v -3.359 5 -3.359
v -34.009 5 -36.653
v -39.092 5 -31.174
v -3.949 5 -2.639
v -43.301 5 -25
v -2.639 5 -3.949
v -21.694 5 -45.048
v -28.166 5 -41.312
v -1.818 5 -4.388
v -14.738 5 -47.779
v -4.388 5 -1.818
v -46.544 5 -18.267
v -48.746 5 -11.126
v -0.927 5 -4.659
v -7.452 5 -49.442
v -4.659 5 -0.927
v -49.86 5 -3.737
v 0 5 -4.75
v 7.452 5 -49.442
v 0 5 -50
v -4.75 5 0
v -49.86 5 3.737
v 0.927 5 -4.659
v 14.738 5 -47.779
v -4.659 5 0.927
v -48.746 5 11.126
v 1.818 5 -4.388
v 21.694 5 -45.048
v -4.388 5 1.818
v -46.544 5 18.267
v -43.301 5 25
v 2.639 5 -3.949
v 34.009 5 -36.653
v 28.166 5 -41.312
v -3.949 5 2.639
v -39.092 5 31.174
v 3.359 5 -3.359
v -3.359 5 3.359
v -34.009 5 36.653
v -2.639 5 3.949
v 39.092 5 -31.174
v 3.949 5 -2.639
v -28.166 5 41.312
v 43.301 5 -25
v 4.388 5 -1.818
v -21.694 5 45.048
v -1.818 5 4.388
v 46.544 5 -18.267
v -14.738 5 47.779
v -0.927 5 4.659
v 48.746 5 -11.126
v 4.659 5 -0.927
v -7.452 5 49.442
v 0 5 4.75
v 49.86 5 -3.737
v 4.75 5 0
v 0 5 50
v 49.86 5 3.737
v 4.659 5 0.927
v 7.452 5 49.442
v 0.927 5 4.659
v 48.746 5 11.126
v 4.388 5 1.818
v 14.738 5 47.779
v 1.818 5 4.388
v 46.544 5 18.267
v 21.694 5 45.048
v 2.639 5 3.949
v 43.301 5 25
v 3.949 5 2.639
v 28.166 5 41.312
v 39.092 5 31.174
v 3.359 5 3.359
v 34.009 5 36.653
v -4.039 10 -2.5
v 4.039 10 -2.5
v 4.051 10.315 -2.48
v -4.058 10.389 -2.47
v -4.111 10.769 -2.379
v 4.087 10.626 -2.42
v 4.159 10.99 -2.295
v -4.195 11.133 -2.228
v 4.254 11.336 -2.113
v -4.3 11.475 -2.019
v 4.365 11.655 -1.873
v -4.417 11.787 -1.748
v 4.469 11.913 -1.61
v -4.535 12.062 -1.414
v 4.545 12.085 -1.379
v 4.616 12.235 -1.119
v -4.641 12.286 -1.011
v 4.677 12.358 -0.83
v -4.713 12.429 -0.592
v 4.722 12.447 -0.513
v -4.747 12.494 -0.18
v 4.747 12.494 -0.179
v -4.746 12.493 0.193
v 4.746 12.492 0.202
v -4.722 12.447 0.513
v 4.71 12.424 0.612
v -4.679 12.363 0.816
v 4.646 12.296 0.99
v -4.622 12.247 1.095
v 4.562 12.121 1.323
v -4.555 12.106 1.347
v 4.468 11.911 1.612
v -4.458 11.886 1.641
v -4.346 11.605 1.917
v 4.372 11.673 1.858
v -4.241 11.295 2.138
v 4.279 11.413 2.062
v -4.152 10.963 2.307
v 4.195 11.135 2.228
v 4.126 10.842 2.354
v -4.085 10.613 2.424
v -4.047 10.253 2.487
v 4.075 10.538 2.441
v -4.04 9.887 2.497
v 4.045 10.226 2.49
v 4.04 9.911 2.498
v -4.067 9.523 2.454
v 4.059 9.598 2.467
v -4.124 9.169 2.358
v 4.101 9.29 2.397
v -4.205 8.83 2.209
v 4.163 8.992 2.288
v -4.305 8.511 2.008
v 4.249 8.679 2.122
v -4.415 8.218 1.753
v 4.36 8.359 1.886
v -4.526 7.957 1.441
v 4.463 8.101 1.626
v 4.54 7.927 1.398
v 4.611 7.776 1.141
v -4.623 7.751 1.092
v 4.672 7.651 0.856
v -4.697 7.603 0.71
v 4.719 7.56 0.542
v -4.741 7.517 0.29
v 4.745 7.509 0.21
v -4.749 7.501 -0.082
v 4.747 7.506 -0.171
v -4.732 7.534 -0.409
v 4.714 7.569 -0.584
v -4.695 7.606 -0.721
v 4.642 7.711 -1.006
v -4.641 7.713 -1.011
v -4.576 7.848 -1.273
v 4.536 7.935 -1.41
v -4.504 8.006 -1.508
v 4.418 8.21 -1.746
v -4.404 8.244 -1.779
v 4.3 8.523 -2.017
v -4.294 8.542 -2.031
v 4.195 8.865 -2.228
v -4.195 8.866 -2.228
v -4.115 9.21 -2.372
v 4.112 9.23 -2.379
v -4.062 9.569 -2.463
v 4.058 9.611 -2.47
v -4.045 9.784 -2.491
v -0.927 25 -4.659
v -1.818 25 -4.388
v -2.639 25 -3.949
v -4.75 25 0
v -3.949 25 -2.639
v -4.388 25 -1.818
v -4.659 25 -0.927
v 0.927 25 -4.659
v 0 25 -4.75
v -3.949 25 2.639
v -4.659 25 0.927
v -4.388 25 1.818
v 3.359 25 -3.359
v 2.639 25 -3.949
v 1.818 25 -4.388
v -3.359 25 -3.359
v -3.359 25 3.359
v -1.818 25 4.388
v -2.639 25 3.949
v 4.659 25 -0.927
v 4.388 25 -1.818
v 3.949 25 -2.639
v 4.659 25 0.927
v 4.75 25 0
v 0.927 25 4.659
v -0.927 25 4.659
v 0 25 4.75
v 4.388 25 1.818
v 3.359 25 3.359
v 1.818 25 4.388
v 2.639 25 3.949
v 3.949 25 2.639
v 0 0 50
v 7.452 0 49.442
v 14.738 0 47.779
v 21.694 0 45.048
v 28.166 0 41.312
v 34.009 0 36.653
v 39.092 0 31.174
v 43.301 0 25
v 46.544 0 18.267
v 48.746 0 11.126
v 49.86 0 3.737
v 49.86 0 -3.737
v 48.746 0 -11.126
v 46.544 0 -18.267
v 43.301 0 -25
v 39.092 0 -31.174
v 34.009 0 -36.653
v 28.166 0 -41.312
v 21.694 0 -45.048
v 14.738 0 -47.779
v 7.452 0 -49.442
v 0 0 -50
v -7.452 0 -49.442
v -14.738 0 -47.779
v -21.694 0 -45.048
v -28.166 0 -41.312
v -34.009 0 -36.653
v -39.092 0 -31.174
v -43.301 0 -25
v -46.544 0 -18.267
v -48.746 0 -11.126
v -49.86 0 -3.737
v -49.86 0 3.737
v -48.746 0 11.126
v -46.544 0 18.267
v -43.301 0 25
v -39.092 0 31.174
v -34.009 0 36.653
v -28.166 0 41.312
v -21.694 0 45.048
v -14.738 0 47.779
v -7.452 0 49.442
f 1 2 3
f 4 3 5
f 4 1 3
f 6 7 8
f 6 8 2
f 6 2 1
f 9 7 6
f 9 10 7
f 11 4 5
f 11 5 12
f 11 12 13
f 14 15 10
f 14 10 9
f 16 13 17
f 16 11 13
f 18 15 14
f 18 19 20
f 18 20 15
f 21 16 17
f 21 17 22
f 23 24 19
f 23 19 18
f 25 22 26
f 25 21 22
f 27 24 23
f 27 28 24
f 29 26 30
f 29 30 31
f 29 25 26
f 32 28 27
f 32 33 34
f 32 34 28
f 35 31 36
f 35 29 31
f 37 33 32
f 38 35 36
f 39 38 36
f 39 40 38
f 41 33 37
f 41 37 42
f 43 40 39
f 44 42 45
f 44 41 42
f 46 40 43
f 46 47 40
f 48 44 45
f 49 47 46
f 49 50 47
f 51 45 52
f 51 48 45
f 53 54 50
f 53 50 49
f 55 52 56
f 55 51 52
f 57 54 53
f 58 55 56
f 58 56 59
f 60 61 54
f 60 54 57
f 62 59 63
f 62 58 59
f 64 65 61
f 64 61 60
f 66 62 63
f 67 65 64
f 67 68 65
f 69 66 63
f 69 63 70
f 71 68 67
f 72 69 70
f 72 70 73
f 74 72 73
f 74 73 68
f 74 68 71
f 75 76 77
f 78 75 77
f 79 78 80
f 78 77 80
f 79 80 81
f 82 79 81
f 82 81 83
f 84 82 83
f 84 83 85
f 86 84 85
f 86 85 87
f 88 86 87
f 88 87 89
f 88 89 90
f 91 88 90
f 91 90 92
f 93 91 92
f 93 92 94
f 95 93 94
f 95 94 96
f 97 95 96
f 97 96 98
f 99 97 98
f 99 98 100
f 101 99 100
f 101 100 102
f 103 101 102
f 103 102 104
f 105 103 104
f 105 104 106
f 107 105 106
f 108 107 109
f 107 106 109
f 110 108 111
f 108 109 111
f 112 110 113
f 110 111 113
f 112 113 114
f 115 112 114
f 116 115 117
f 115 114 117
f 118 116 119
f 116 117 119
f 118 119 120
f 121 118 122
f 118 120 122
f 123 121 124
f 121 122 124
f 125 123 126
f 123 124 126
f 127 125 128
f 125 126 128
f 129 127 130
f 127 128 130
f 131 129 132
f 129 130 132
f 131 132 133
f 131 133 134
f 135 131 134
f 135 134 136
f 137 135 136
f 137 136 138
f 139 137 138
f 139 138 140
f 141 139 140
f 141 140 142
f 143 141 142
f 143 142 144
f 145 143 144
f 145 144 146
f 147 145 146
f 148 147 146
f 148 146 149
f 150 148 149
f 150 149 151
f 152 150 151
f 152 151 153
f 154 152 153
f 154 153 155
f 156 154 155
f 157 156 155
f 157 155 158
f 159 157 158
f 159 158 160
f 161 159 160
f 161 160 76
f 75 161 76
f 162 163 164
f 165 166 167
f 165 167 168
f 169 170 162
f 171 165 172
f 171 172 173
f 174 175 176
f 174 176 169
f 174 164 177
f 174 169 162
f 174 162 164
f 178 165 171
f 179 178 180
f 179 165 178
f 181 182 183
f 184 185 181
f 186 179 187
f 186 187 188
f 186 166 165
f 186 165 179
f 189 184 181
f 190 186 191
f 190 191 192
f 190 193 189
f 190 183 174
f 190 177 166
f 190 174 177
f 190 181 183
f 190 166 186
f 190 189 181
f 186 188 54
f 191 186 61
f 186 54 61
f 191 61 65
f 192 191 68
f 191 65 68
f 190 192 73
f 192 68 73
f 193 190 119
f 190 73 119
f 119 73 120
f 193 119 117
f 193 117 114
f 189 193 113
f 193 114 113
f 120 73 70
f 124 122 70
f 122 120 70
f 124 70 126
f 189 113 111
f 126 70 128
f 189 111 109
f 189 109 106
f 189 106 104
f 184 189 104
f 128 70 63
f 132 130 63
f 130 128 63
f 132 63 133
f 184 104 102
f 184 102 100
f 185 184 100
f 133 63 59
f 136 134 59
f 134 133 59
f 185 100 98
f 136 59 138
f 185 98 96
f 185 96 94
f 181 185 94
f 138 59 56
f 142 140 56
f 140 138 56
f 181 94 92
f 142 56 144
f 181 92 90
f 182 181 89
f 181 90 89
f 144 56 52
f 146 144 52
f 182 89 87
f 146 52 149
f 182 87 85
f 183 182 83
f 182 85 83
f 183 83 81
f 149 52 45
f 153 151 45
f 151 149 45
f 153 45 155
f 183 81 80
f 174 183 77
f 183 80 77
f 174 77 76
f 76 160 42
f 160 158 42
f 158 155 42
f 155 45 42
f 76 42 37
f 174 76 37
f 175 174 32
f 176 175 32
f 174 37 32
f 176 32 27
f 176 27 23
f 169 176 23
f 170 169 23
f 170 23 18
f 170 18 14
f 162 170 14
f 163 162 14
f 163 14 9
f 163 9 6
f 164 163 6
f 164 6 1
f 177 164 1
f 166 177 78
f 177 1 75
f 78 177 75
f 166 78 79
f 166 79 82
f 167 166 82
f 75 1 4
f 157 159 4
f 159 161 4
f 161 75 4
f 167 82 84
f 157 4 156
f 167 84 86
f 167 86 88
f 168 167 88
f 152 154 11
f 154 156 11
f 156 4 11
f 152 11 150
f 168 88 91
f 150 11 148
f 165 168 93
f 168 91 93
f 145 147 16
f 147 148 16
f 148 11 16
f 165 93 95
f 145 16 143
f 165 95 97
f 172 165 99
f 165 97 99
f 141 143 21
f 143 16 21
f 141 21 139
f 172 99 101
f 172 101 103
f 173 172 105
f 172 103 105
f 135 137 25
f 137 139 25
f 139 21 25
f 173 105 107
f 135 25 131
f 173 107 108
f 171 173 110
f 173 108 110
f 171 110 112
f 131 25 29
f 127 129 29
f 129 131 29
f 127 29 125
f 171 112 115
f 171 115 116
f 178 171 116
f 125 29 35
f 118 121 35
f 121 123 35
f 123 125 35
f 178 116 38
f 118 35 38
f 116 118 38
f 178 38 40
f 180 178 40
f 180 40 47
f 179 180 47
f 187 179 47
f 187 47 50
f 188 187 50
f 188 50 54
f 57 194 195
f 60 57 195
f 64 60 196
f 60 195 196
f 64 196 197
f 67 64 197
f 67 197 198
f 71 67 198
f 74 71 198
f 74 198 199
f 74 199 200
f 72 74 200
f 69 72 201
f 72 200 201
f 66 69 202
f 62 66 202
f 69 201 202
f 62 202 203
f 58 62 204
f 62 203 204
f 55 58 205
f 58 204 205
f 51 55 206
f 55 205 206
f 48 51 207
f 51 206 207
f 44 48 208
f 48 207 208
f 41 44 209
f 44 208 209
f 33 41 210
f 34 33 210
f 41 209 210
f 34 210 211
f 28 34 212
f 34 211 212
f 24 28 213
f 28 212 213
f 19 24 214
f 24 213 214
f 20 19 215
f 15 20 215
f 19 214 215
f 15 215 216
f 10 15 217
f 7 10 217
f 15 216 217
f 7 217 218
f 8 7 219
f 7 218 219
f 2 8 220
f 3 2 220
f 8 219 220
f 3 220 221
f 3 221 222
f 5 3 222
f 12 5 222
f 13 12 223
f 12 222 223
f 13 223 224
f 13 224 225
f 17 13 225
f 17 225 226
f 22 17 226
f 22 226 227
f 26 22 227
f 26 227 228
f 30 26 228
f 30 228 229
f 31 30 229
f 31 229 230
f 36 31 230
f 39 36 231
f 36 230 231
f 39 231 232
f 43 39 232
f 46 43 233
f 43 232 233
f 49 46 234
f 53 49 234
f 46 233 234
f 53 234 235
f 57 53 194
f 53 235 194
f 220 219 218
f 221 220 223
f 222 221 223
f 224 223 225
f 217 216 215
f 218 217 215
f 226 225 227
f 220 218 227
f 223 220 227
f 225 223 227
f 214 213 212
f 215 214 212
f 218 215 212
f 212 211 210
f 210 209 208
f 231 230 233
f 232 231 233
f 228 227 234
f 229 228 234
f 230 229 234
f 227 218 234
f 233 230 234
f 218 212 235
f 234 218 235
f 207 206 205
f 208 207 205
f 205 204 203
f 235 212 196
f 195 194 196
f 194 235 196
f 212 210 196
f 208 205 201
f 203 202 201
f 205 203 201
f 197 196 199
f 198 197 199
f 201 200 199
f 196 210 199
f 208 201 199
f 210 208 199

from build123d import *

# Parameters (mm, degrees)
SKETCH1_R               = 50
BOSS_EXTRUDE1_DEPTH     = 5
SKETCH2_R               = 4.75
BOSS_EXTRUDE2_DEPTH     = 20
CUT_EXTRUDE1_REACH      = 80.247
CUT_EXTRUDE1_END_RADIUS = 4.75
SKETCH3_R               = 2.5


with BuildPart() as part:
    # Sketch1 → Boss-Extrude1 (new body)
    with BuildSketch(Plane(origin=(0, 0, 0), x_dir=(1, 0, 0), z_dir=(0, 1, 0))):
        with Locations(Location((0, 0, 0), (0, 0, 270))):
            Circle(SKETCH1_R)
    extrude(amount=BOSS_EXTRUDE1_DEPTH)

    # Sketch2 → Boss-Extrude2 (add)
    with BuildSketch(Plane(origin=(0, 5, 0), x_dir=(1, 0, 0), z_dir=(0, 1, 0))):
        with Locations(Location((0, 0, 0), (0, 0, 270))):
            Circle(SKETCH2_R)
    extrude(amount=BOSS_EXTRUDE2_DEPTH)

    # Cut-Extrude1: up to this cylinder (the profile starts inside it)
    cut_extrude1_end = Plane(origin=(0, 10, 0), z_dir=(0, -1, 0)) * Cylinder(CUT_EXTRUDE1_END_RADIUS, 170.994, mode=Mode.PRIVATE)
    # Sketch3 → Cut-Extrude1 (cut, up to the surface)
    with BuildSketch(Plane(origin=(4.75, 0, 0), x_dir=(0, 0, -1), z_dir=(1, 0, 0)), mode=Mode.PRIVATE) as cut_extrude1_sk1:
        with Locations((0, 10)):
            Circle(SKETCH3_R)
    cut_extrude1_tool1 = extrude(cut_extrude1_sk1.sketch, amount=-CUT_EXTRUDE1_REACH, mode=Mode.PRIVATE) & cut_extrude1_end
    add(cut_extrude1_tool1.solids().sort_by_distance((4.75, 10, 0))[0], mode=Mode.SUBTRACT)


solid = part.part
